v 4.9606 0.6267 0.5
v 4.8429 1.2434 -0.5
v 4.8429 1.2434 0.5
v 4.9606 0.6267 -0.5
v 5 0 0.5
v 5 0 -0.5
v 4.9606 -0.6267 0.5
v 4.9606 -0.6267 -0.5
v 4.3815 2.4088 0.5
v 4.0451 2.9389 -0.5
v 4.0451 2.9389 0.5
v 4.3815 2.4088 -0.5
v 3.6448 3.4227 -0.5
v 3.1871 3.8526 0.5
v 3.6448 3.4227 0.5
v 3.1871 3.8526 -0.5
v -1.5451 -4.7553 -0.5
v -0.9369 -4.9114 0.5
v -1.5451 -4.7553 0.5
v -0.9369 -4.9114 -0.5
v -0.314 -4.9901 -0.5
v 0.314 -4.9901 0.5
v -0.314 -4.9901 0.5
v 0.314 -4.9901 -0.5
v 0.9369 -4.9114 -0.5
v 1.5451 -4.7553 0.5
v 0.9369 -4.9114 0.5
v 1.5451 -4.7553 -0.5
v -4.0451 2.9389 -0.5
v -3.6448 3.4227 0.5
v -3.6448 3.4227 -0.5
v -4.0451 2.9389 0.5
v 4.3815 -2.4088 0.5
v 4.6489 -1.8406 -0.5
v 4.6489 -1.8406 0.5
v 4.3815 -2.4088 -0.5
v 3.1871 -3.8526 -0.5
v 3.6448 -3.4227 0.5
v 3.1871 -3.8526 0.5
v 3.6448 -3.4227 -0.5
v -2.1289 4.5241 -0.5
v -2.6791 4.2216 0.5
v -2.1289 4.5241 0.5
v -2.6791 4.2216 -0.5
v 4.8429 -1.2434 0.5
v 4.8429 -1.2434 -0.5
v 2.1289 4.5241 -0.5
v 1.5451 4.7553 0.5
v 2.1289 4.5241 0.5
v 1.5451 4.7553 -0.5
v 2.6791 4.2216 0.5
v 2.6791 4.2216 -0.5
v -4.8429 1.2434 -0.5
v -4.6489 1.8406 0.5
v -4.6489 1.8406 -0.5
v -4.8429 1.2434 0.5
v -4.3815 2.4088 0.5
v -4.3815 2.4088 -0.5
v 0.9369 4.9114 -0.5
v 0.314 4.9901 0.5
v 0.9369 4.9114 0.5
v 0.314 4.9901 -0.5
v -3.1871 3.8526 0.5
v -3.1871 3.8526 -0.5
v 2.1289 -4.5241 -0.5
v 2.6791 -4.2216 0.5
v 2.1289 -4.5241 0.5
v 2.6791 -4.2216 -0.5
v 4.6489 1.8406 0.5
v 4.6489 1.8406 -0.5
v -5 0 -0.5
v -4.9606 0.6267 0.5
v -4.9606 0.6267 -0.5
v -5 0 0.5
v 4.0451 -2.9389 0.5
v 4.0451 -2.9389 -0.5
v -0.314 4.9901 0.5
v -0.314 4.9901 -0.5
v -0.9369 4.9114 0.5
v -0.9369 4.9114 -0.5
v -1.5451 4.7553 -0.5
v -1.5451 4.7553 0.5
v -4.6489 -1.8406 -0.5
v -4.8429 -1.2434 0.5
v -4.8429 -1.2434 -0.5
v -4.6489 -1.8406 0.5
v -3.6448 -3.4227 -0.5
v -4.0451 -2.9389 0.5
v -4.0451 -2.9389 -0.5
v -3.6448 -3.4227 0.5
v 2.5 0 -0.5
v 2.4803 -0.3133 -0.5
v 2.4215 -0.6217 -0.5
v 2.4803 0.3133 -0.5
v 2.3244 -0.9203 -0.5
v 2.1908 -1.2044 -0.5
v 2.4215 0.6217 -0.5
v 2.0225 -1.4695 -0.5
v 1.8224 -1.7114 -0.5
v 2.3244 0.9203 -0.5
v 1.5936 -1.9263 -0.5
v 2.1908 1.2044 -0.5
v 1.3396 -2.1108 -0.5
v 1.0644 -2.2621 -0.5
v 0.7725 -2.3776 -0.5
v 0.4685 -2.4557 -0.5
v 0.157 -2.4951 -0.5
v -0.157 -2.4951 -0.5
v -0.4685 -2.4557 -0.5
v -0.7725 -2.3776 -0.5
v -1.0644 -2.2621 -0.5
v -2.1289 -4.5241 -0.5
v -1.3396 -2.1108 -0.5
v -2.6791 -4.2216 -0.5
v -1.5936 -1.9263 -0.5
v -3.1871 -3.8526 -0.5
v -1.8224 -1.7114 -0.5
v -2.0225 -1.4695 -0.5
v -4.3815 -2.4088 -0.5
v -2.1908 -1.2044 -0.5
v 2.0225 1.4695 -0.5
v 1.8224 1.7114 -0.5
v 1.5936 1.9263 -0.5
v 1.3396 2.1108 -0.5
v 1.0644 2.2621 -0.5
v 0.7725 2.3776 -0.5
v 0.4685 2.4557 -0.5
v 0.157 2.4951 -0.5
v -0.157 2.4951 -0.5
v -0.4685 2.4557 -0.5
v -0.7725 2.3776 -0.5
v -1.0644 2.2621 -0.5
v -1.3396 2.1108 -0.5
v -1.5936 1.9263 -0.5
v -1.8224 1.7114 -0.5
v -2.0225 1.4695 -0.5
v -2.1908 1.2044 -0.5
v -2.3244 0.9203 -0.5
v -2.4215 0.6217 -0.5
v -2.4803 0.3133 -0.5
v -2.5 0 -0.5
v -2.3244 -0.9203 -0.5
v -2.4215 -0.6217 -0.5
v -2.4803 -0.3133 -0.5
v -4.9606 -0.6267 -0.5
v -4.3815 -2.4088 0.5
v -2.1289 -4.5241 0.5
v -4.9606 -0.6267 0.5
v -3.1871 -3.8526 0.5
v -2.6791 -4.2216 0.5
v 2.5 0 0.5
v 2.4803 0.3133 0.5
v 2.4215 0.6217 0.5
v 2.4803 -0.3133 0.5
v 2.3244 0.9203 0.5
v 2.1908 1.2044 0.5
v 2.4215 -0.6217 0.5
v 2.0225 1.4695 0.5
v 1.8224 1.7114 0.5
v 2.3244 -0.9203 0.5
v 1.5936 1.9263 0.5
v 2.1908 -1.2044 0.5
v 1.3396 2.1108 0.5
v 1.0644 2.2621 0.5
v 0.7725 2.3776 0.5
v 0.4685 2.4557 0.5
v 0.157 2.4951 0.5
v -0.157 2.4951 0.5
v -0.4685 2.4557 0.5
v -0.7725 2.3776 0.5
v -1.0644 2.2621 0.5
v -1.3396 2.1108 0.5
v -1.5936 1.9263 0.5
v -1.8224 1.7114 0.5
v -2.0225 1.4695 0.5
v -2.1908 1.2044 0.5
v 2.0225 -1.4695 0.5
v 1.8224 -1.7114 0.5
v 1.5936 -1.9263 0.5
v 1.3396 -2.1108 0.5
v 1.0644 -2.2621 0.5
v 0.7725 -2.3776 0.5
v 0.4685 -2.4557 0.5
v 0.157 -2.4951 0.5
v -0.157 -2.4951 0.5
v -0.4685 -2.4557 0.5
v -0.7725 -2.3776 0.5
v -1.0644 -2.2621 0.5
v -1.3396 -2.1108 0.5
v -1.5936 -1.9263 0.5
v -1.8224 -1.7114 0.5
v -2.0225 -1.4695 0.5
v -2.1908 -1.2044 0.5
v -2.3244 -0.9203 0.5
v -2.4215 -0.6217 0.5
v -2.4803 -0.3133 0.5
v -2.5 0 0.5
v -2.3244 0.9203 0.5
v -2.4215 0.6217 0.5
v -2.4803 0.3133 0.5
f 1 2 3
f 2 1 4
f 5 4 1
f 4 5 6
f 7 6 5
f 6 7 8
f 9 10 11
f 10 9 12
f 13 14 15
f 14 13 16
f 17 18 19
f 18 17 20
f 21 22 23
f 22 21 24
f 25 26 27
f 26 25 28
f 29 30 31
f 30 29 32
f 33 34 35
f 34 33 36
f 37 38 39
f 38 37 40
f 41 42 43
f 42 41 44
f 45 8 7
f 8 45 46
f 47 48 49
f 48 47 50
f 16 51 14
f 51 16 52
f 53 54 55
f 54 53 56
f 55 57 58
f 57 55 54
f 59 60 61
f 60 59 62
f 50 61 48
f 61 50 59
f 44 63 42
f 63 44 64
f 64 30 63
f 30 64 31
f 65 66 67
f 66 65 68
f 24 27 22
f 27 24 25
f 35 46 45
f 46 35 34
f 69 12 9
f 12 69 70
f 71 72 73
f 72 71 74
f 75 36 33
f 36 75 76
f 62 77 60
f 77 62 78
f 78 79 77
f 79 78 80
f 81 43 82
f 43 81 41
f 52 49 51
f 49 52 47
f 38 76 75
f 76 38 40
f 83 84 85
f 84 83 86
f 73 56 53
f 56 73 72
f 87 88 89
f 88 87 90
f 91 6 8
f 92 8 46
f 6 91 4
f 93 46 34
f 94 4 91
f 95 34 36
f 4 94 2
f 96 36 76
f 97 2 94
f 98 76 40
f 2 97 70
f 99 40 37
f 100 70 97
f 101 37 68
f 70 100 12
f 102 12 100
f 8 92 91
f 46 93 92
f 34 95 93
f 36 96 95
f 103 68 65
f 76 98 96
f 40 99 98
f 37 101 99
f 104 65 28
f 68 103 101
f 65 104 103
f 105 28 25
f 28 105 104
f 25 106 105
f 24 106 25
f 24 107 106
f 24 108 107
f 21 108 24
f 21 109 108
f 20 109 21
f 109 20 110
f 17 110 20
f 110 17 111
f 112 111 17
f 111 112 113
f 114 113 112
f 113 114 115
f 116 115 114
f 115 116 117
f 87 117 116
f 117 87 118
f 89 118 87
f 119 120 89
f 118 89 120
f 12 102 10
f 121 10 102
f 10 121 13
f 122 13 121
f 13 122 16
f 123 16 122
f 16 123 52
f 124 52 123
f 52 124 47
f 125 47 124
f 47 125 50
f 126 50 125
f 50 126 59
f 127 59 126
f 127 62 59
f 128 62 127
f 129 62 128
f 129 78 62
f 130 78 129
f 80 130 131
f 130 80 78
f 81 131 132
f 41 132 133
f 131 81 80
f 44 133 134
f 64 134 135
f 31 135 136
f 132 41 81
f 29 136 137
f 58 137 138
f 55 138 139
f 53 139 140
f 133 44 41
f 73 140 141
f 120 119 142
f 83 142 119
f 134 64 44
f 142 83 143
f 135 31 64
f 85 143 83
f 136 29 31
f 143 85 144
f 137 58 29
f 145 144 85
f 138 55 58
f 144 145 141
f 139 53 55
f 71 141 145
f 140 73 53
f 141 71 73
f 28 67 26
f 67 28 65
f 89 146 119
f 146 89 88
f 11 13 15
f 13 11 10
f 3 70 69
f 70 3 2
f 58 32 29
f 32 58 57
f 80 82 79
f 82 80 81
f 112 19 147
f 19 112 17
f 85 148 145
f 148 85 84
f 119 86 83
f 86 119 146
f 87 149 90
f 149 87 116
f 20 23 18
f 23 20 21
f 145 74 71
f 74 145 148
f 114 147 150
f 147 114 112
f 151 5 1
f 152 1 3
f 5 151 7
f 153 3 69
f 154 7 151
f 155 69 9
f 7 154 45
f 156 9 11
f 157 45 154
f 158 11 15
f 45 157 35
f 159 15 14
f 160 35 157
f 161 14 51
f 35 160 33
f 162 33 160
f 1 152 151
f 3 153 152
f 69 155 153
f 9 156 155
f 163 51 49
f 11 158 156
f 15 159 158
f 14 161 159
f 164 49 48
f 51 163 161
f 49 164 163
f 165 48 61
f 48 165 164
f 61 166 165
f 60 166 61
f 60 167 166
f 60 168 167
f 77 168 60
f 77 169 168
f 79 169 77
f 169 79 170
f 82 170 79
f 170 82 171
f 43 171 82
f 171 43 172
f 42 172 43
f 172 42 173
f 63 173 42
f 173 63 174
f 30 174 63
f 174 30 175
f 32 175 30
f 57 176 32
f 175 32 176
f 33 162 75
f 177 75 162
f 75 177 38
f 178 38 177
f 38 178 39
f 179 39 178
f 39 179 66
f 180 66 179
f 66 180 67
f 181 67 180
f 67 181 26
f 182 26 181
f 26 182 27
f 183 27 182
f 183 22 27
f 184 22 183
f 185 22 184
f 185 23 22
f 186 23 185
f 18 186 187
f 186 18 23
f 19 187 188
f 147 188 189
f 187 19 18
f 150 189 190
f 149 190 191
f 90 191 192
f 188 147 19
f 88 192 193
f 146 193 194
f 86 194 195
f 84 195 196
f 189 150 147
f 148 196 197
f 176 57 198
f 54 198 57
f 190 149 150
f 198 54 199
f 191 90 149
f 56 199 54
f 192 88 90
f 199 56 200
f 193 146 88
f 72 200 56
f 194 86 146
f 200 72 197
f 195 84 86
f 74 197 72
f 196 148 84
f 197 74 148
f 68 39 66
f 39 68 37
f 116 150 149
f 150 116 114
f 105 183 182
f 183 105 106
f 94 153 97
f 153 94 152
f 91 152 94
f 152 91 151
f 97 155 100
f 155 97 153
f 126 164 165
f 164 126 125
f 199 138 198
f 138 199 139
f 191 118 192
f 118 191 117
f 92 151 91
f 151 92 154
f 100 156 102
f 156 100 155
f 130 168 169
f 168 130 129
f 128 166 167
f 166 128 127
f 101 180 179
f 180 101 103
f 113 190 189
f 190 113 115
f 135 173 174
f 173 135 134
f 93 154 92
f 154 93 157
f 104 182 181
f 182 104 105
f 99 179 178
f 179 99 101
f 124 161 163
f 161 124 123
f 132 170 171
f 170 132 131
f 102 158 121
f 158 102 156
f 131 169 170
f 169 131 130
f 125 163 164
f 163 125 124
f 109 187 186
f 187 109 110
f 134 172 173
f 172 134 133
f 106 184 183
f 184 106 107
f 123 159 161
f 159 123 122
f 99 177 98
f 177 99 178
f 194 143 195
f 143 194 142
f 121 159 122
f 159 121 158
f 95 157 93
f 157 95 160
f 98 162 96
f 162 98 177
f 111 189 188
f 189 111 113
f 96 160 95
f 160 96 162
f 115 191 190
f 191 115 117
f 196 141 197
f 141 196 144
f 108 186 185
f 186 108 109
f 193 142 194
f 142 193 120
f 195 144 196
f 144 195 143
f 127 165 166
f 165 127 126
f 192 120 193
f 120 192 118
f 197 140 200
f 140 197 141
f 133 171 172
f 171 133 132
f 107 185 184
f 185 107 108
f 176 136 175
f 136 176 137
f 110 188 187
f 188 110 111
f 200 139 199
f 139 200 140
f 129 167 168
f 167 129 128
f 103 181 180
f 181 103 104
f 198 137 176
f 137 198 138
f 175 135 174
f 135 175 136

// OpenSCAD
$fn = 50;


difference() {
	union() {
		translate(v = [0, 0, -0.5000000000]) {
			cylinder(h = 1, r = 5.0000000000);
		}
	}
	union() {
		translate(v = [0, 0, -100.0000000000]) {
			cylinder(h = 200, r = 2.5000000000);
		}
	}
}
